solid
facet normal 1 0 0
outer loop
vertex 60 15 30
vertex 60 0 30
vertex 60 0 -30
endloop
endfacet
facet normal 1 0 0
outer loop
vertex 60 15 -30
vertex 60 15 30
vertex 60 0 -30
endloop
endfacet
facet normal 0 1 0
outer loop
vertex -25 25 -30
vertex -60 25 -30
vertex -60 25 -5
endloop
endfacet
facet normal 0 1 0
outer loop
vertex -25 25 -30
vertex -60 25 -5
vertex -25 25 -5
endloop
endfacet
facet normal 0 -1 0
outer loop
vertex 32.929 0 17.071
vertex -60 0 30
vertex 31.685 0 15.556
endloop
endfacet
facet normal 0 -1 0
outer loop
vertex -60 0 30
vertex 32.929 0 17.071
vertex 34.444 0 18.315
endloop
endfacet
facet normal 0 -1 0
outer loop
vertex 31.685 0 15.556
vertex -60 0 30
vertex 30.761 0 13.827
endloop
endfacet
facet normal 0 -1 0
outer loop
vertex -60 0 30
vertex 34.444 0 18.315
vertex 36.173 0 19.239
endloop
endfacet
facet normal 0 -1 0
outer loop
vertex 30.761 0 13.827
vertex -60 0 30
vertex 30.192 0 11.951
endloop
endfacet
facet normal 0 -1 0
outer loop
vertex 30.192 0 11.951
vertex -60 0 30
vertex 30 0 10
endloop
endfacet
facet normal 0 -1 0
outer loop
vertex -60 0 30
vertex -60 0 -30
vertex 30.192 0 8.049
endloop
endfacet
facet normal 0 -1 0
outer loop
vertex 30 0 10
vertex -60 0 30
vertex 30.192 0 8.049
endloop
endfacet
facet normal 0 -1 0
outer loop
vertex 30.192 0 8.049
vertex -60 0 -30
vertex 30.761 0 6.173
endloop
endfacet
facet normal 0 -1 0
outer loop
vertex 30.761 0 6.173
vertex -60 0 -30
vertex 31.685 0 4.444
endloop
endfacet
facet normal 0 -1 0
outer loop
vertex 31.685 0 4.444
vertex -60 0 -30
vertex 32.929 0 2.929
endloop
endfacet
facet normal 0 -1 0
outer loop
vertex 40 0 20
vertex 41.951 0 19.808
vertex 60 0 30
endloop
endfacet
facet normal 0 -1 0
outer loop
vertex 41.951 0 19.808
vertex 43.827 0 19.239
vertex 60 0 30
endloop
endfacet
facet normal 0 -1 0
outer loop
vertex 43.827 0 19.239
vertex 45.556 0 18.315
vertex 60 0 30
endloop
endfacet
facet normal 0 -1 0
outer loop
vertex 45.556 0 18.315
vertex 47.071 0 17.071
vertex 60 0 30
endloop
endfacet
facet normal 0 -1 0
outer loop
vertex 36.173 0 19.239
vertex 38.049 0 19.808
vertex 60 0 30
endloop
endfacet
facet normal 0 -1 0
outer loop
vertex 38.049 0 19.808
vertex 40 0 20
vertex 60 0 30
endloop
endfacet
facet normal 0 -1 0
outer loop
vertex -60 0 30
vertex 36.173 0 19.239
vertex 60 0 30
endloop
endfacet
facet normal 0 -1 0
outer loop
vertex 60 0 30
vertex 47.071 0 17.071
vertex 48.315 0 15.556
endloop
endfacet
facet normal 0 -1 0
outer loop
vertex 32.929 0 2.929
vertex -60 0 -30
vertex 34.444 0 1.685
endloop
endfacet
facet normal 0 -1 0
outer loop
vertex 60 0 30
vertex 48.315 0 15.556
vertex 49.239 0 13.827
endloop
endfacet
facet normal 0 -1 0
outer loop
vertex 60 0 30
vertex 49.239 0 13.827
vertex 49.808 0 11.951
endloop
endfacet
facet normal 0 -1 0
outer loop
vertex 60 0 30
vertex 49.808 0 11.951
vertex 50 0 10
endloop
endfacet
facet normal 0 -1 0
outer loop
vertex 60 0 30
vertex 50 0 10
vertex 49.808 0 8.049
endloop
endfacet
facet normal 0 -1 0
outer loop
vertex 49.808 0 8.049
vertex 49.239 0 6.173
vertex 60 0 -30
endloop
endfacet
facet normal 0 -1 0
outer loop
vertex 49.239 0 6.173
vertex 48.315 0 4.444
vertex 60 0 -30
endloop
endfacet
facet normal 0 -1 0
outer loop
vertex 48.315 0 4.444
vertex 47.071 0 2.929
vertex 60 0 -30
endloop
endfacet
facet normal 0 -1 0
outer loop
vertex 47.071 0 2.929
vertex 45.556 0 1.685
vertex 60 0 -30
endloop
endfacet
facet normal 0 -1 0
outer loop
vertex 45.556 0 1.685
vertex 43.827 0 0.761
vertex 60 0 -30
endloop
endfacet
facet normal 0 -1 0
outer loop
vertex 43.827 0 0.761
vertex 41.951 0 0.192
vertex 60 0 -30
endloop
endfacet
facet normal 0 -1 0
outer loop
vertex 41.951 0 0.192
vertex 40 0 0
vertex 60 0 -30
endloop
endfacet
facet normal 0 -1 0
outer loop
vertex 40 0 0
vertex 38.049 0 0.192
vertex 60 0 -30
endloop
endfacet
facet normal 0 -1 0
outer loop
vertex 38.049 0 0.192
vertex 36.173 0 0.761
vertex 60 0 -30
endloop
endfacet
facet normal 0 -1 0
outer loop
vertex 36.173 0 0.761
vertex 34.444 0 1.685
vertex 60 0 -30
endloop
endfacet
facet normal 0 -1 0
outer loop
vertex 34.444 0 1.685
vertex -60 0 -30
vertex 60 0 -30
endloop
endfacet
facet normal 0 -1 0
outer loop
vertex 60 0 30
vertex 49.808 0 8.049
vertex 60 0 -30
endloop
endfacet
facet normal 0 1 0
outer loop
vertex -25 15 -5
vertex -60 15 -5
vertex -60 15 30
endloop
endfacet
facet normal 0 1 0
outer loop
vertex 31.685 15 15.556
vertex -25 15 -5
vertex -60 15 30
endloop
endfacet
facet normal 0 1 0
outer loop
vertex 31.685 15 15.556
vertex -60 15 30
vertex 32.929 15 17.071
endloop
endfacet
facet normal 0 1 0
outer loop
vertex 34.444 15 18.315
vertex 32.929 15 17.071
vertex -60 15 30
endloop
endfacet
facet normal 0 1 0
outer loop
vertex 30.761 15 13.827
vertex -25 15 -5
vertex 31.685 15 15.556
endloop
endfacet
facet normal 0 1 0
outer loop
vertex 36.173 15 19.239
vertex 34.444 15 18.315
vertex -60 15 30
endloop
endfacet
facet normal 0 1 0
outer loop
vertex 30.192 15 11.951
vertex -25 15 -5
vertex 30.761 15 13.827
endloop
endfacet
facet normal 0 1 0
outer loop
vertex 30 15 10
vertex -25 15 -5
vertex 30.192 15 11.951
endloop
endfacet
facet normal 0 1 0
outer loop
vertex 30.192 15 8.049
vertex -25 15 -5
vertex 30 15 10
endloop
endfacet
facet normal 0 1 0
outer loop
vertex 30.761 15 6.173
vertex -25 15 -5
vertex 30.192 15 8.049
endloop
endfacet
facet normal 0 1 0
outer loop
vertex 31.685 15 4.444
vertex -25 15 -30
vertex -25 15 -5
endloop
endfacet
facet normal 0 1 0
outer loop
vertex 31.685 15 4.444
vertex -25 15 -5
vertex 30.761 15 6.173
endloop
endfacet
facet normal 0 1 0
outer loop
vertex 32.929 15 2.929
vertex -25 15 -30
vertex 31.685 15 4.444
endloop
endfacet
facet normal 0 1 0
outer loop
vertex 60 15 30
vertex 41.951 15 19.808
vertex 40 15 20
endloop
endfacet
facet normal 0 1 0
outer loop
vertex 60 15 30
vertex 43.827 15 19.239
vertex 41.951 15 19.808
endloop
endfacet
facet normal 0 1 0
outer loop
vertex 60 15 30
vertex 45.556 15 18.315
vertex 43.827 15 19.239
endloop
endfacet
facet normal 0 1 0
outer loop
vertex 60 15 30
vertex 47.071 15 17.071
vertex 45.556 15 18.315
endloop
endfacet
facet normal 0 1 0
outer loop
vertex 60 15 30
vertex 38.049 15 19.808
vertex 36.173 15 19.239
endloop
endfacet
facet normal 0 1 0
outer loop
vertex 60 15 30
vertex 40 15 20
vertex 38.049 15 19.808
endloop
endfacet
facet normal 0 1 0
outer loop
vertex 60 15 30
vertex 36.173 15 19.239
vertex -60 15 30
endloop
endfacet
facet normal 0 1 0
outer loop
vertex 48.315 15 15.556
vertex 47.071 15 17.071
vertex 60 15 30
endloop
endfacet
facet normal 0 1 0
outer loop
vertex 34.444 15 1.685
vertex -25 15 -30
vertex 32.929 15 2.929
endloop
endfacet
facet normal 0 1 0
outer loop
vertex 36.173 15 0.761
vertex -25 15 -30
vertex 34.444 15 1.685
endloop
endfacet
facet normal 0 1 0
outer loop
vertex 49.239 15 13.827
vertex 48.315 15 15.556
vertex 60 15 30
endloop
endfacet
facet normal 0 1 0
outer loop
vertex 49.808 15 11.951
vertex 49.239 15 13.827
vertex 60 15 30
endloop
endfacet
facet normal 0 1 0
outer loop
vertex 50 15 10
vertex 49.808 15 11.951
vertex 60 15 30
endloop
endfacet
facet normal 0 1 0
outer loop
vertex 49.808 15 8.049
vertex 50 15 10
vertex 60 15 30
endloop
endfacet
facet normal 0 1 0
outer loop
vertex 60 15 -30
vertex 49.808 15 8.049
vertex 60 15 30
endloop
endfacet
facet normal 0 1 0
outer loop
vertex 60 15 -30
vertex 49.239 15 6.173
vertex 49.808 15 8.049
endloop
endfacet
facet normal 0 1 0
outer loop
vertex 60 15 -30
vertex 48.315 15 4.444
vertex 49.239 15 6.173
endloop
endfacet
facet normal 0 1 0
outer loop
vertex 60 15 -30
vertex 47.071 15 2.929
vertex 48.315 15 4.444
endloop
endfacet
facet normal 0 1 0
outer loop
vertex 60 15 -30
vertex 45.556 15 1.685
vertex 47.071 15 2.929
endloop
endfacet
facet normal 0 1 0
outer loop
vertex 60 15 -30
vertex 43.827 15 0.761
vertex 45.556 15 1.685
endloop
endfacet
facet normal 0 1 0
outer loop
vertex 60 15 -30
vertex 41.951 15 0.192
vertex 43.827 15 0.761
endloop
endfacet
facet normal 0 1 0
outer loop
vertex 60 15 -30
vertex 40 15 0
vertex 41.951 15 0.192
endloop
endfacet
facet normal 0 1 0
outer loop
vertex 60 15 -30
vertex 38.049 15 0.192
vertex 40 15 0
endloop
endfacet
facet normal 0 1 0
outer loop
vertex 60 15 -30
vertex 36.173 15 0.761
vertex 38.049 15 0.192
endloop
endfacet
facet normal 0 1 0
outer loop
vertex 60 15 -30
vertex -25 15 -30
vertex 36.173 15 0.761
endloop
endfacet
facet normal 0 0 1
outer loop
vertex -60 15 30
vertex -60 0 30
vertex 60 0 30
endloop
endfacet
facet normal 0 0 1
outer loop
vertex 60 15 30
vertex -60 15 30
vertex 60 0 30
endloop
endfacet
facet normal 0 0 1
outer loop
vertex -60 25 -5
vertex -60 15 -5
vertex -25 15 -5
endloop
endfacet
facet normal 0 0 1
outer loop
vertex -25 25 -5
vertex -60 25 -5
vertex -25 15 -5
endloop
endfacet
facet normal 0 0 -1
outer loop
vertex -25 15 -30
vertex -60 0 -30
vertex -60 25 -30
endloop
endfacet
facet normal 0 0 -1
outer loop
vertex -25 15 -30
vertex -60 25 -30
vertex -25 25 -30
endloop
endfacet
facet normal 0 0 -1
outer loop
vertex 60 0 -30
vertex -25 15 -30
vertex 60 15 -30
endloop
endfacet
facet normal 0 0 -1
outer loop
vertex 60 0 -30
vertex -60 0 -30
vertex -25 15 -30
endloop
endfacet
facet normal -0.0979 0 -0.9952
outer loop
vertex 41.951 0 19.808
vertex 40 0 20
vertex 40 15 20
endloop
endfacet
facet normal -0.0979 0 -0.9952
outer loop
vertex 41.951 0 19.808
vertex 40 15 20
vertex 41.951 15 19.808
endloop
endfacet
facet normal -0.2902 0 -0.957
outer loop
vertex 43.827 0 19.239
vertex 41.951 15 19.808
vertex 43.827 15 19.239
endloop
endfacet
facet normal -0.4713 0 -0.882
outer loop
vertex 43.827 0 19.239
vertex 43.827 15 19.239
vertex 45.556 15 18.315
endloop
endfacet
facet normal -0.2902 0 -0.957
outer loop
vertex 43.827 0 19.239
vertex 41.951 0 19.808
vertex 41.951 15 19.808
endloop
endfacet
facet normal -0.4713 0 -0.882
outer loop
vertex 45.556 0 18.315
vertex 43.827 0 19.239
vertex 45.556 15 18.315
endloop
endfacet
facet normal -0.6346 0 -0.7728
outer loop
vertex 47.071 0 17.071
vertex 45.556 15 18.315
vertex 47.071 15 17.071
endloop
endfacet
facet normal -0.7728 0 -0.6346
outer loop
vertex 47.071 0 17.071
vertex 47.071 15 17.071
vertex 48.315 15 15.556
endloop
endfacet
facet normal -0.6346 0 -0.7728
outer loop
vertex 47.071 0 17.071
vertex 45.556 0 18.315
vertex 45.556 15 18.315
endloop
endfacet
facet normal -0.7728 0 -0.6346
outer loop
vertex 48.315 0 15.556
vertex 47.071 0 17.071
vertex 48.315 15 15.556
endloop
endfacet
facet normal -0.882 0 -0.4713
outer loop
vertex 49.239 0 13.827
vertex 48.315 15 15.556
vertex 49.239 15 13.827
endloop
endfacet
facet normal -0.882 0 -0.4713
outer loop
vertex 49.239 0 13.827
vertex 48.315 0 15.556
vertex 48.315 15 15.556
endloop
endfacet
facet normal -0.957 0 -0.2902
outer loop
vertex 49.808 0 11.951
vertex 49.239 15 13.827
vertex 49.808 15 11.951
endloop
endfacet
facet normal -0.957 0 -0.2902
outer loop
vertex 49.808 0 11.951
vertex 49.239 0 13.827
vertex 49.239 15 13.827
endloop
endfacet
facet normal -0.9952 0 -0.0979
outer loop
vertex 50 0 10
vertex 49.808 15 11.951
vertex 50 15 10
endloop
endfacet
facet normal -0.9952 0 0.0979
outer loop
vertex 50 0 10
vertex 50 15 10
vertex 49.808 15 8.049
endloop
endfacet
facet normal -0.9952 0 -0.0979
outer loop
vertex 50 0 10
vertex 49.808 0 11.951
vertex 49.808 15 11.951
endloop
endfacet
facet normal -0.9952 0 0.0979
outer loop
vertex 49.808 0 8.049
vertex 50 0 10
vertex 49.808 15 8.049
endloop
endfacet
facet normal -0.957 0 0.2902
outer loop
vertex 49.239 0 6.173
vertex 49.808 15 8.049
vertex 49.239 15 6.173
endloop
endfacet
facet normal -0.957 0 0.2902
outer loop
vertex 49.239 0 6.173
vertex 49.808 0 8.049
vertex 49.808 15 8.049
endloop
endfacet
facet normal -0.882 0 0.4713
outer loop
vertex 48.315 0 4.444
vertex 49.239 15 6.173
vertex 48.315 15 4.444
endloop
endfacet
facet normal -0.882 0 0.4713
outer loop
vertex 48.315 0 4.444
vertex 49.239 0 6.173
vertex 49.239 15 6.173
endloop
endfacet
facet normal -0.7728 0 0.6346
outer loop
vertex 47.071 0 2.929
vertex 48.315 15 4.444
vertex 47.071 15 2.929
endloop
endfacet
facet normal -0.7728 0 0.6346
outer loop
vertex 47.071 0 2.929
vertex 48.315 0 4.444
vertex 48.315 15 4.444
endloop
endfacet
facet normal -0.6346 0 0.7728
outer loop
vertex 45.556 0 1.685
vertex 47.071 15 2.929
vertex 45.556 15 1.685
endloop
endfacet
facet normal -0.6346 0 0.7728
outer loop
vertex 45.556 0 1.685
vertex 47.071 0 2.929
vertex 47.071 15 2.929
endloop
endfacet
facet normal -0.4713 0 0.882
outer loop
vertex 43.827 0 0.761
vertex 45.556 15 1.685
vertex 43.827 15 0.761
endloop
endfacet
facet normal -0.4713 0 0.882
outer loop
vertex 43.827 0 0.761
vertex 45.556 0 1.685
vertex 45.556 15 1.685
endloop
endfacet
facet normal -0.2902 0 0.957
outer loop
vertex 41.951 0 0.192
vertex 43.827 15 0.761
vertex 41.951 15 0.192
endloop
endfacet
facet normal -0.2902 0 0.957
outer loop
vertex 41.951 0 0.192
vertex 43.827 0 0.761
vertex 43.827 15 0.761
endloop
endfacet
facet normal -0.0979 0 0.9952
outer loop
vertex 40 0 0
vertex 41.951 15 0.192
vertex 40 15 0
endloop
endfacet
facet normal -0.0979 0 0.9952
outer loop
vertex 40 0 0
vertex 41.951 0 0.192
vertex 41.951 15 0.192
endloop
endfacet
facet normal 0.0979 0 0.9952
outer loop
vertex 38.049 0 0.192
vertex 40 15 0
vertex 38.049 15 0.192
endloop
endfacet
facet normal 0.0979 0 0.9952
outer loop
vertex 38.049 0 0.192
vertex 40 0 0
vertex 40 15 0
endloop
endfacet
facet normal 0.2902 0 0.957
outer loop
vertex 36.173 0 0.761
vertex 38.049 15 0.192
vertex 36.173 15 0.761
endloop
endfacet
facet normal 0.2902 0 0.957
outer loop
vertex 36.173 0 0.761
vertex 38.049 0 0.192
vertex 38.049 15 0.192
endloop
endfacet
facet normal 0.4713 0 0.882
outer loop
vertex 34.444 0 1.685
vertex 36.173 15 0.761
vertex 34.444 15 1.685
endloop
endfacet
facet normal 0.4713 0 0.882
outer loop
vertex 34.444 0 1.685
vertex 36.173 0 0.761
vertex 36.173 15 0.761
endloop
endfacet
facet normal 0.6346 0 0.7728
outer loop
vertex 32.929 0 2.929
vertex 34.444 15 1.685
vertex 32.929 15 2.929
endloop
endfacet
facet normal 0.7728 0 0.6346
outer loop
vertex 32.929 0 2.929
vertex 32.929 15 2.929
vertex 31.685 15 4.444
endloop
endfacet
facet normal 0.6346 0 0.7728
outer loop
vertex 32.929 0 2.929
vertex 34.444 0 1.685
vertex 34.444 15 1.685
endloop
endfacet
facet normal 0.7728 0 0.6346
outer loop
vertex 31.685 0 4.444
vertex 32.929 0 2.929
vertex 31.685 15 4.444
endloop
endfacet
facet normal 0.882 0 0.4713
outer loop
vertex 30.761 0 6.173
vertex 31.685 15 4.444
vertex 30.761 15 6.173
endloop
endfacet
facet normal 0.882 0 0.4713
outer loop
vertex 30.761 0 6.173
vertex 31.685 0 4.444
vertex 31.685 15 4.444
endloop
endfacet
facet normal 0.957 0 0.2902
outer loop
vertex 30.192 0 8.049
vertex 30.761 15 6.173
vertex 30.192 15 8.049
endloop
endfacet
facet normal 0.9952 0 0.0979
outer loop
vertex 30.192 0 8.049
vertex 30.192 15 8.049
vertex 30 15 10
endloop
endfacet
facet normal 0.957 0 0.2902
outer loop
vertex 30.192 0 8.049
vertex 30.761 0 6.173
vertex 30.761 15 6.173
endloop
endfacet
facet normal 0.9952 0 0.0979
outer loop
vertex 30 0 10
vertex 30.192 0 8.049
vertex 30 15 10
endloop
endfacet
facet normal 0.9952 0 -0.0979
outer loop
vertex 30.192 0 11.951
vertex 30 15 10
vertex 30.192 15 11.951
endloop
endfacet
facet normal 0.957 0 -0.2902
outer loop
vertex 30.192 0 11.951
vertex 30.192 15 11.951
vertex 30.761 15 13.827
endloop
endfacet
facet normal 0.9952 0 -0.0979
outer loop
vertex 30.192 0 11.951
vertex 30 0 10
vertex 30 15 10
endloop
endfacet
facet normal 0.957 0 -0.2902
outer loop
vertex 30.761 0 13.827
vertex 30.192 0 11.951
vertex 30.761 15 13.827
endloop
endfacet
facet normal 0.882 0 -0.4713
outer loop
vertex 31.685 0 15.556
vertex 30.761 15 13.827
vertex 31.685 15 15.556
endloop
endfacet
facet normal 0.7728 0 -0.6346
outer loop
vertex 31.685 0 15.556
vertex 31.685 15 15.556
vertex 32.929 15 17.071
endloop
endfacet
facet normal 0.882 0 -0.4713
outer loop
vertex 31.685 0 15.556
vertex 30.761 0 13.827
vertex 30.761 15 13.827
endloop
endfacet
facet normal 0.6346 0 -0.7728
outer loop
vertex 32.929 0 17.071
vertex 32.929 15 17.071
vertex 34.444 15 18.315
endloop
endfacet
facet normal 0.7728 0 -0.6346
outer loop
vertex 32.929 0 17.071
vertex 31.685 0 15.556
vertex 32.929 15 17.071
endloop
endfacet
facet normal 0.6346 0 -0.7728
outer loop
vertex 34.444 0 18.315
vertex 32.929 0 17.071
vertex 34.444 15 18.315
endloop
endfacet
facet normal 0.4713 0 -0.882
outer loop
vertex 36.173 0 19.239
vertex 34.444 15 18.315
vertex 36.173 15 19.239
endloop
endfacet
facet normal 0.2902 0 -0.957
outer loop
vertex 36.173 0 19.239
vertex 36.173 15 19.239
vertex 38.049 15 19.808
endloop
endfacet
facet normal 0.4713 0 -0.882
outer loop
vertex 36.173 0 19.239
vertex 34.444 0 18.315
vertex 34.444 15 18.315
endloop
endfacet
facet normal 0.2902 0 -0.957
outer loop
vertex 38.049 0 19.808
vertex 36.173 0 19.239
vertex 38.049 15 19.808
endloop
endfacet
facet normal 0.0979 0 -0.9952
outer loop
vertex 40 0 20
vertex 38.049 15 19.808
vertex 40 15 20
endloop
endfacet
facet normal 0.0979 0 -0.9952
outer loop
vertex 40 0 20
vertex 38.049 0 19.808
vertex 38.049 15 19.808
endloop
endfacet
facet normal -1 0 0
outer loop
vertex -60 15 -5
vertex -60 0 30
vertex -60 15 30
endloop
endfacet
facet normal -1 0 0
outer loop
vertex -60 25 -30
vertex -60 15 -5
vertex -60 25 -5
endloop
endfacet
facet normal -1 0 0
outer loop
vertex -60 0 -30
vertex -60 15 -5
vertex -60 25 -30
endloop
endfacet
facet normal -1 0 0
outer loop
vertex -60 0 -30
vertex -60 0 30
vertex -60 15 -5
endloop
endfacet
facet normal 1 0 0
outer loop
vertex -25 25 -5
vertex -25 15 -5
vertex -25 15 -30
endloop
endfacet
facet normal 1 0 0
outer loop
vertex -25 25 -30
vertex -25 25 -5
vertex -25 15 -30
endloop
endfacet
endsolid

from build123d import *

# Parameters (mm, degrees)
CROQUIS1_W              = 120
CROQUIS1_H              = 60
CROQUIS1_R              = 10
SALIENTE_EXTRUIR1_DEPTH = 15
CROQUIS2_W              = 35
CROQUIS2_H              = 25
SALIENTE_EXTRUIR2_DEPTH = 10


with BuildPart() as part:
    # Croquis1 → Saliente-Extruir1 (new body)
    with BuildSketch(Plane(origin=(0, 0, 0), x_dir=(1, 0, 0), z_dir=(0, 1, 0))):
        Rectangle(CROQUIS1_W, CROQUIS1_H)
        with Locations(Location((40, -10, 0), (0, 0, 270))):
            Circle(CROQUIS1_R, mode=Mode.SUBTRACT)
    extrude(amount=SALIENTE_EXTRUIR1_DEPTH)

    # Croquis2 → Saliente-Extruir2 (add)
    with BuildSketch(Plane(origin=(0, 15, 0), x_dir=(1, 0, 0), z_dir=(0, 1, 0))):
        with Locations((-42.5, 17.5)):
            Rectangle(CROQUIS2_W, CROQUIS2_H)
    extrude(amount=SALIENTE_EXTRUIR2_DEPTH)


solid = part.part
